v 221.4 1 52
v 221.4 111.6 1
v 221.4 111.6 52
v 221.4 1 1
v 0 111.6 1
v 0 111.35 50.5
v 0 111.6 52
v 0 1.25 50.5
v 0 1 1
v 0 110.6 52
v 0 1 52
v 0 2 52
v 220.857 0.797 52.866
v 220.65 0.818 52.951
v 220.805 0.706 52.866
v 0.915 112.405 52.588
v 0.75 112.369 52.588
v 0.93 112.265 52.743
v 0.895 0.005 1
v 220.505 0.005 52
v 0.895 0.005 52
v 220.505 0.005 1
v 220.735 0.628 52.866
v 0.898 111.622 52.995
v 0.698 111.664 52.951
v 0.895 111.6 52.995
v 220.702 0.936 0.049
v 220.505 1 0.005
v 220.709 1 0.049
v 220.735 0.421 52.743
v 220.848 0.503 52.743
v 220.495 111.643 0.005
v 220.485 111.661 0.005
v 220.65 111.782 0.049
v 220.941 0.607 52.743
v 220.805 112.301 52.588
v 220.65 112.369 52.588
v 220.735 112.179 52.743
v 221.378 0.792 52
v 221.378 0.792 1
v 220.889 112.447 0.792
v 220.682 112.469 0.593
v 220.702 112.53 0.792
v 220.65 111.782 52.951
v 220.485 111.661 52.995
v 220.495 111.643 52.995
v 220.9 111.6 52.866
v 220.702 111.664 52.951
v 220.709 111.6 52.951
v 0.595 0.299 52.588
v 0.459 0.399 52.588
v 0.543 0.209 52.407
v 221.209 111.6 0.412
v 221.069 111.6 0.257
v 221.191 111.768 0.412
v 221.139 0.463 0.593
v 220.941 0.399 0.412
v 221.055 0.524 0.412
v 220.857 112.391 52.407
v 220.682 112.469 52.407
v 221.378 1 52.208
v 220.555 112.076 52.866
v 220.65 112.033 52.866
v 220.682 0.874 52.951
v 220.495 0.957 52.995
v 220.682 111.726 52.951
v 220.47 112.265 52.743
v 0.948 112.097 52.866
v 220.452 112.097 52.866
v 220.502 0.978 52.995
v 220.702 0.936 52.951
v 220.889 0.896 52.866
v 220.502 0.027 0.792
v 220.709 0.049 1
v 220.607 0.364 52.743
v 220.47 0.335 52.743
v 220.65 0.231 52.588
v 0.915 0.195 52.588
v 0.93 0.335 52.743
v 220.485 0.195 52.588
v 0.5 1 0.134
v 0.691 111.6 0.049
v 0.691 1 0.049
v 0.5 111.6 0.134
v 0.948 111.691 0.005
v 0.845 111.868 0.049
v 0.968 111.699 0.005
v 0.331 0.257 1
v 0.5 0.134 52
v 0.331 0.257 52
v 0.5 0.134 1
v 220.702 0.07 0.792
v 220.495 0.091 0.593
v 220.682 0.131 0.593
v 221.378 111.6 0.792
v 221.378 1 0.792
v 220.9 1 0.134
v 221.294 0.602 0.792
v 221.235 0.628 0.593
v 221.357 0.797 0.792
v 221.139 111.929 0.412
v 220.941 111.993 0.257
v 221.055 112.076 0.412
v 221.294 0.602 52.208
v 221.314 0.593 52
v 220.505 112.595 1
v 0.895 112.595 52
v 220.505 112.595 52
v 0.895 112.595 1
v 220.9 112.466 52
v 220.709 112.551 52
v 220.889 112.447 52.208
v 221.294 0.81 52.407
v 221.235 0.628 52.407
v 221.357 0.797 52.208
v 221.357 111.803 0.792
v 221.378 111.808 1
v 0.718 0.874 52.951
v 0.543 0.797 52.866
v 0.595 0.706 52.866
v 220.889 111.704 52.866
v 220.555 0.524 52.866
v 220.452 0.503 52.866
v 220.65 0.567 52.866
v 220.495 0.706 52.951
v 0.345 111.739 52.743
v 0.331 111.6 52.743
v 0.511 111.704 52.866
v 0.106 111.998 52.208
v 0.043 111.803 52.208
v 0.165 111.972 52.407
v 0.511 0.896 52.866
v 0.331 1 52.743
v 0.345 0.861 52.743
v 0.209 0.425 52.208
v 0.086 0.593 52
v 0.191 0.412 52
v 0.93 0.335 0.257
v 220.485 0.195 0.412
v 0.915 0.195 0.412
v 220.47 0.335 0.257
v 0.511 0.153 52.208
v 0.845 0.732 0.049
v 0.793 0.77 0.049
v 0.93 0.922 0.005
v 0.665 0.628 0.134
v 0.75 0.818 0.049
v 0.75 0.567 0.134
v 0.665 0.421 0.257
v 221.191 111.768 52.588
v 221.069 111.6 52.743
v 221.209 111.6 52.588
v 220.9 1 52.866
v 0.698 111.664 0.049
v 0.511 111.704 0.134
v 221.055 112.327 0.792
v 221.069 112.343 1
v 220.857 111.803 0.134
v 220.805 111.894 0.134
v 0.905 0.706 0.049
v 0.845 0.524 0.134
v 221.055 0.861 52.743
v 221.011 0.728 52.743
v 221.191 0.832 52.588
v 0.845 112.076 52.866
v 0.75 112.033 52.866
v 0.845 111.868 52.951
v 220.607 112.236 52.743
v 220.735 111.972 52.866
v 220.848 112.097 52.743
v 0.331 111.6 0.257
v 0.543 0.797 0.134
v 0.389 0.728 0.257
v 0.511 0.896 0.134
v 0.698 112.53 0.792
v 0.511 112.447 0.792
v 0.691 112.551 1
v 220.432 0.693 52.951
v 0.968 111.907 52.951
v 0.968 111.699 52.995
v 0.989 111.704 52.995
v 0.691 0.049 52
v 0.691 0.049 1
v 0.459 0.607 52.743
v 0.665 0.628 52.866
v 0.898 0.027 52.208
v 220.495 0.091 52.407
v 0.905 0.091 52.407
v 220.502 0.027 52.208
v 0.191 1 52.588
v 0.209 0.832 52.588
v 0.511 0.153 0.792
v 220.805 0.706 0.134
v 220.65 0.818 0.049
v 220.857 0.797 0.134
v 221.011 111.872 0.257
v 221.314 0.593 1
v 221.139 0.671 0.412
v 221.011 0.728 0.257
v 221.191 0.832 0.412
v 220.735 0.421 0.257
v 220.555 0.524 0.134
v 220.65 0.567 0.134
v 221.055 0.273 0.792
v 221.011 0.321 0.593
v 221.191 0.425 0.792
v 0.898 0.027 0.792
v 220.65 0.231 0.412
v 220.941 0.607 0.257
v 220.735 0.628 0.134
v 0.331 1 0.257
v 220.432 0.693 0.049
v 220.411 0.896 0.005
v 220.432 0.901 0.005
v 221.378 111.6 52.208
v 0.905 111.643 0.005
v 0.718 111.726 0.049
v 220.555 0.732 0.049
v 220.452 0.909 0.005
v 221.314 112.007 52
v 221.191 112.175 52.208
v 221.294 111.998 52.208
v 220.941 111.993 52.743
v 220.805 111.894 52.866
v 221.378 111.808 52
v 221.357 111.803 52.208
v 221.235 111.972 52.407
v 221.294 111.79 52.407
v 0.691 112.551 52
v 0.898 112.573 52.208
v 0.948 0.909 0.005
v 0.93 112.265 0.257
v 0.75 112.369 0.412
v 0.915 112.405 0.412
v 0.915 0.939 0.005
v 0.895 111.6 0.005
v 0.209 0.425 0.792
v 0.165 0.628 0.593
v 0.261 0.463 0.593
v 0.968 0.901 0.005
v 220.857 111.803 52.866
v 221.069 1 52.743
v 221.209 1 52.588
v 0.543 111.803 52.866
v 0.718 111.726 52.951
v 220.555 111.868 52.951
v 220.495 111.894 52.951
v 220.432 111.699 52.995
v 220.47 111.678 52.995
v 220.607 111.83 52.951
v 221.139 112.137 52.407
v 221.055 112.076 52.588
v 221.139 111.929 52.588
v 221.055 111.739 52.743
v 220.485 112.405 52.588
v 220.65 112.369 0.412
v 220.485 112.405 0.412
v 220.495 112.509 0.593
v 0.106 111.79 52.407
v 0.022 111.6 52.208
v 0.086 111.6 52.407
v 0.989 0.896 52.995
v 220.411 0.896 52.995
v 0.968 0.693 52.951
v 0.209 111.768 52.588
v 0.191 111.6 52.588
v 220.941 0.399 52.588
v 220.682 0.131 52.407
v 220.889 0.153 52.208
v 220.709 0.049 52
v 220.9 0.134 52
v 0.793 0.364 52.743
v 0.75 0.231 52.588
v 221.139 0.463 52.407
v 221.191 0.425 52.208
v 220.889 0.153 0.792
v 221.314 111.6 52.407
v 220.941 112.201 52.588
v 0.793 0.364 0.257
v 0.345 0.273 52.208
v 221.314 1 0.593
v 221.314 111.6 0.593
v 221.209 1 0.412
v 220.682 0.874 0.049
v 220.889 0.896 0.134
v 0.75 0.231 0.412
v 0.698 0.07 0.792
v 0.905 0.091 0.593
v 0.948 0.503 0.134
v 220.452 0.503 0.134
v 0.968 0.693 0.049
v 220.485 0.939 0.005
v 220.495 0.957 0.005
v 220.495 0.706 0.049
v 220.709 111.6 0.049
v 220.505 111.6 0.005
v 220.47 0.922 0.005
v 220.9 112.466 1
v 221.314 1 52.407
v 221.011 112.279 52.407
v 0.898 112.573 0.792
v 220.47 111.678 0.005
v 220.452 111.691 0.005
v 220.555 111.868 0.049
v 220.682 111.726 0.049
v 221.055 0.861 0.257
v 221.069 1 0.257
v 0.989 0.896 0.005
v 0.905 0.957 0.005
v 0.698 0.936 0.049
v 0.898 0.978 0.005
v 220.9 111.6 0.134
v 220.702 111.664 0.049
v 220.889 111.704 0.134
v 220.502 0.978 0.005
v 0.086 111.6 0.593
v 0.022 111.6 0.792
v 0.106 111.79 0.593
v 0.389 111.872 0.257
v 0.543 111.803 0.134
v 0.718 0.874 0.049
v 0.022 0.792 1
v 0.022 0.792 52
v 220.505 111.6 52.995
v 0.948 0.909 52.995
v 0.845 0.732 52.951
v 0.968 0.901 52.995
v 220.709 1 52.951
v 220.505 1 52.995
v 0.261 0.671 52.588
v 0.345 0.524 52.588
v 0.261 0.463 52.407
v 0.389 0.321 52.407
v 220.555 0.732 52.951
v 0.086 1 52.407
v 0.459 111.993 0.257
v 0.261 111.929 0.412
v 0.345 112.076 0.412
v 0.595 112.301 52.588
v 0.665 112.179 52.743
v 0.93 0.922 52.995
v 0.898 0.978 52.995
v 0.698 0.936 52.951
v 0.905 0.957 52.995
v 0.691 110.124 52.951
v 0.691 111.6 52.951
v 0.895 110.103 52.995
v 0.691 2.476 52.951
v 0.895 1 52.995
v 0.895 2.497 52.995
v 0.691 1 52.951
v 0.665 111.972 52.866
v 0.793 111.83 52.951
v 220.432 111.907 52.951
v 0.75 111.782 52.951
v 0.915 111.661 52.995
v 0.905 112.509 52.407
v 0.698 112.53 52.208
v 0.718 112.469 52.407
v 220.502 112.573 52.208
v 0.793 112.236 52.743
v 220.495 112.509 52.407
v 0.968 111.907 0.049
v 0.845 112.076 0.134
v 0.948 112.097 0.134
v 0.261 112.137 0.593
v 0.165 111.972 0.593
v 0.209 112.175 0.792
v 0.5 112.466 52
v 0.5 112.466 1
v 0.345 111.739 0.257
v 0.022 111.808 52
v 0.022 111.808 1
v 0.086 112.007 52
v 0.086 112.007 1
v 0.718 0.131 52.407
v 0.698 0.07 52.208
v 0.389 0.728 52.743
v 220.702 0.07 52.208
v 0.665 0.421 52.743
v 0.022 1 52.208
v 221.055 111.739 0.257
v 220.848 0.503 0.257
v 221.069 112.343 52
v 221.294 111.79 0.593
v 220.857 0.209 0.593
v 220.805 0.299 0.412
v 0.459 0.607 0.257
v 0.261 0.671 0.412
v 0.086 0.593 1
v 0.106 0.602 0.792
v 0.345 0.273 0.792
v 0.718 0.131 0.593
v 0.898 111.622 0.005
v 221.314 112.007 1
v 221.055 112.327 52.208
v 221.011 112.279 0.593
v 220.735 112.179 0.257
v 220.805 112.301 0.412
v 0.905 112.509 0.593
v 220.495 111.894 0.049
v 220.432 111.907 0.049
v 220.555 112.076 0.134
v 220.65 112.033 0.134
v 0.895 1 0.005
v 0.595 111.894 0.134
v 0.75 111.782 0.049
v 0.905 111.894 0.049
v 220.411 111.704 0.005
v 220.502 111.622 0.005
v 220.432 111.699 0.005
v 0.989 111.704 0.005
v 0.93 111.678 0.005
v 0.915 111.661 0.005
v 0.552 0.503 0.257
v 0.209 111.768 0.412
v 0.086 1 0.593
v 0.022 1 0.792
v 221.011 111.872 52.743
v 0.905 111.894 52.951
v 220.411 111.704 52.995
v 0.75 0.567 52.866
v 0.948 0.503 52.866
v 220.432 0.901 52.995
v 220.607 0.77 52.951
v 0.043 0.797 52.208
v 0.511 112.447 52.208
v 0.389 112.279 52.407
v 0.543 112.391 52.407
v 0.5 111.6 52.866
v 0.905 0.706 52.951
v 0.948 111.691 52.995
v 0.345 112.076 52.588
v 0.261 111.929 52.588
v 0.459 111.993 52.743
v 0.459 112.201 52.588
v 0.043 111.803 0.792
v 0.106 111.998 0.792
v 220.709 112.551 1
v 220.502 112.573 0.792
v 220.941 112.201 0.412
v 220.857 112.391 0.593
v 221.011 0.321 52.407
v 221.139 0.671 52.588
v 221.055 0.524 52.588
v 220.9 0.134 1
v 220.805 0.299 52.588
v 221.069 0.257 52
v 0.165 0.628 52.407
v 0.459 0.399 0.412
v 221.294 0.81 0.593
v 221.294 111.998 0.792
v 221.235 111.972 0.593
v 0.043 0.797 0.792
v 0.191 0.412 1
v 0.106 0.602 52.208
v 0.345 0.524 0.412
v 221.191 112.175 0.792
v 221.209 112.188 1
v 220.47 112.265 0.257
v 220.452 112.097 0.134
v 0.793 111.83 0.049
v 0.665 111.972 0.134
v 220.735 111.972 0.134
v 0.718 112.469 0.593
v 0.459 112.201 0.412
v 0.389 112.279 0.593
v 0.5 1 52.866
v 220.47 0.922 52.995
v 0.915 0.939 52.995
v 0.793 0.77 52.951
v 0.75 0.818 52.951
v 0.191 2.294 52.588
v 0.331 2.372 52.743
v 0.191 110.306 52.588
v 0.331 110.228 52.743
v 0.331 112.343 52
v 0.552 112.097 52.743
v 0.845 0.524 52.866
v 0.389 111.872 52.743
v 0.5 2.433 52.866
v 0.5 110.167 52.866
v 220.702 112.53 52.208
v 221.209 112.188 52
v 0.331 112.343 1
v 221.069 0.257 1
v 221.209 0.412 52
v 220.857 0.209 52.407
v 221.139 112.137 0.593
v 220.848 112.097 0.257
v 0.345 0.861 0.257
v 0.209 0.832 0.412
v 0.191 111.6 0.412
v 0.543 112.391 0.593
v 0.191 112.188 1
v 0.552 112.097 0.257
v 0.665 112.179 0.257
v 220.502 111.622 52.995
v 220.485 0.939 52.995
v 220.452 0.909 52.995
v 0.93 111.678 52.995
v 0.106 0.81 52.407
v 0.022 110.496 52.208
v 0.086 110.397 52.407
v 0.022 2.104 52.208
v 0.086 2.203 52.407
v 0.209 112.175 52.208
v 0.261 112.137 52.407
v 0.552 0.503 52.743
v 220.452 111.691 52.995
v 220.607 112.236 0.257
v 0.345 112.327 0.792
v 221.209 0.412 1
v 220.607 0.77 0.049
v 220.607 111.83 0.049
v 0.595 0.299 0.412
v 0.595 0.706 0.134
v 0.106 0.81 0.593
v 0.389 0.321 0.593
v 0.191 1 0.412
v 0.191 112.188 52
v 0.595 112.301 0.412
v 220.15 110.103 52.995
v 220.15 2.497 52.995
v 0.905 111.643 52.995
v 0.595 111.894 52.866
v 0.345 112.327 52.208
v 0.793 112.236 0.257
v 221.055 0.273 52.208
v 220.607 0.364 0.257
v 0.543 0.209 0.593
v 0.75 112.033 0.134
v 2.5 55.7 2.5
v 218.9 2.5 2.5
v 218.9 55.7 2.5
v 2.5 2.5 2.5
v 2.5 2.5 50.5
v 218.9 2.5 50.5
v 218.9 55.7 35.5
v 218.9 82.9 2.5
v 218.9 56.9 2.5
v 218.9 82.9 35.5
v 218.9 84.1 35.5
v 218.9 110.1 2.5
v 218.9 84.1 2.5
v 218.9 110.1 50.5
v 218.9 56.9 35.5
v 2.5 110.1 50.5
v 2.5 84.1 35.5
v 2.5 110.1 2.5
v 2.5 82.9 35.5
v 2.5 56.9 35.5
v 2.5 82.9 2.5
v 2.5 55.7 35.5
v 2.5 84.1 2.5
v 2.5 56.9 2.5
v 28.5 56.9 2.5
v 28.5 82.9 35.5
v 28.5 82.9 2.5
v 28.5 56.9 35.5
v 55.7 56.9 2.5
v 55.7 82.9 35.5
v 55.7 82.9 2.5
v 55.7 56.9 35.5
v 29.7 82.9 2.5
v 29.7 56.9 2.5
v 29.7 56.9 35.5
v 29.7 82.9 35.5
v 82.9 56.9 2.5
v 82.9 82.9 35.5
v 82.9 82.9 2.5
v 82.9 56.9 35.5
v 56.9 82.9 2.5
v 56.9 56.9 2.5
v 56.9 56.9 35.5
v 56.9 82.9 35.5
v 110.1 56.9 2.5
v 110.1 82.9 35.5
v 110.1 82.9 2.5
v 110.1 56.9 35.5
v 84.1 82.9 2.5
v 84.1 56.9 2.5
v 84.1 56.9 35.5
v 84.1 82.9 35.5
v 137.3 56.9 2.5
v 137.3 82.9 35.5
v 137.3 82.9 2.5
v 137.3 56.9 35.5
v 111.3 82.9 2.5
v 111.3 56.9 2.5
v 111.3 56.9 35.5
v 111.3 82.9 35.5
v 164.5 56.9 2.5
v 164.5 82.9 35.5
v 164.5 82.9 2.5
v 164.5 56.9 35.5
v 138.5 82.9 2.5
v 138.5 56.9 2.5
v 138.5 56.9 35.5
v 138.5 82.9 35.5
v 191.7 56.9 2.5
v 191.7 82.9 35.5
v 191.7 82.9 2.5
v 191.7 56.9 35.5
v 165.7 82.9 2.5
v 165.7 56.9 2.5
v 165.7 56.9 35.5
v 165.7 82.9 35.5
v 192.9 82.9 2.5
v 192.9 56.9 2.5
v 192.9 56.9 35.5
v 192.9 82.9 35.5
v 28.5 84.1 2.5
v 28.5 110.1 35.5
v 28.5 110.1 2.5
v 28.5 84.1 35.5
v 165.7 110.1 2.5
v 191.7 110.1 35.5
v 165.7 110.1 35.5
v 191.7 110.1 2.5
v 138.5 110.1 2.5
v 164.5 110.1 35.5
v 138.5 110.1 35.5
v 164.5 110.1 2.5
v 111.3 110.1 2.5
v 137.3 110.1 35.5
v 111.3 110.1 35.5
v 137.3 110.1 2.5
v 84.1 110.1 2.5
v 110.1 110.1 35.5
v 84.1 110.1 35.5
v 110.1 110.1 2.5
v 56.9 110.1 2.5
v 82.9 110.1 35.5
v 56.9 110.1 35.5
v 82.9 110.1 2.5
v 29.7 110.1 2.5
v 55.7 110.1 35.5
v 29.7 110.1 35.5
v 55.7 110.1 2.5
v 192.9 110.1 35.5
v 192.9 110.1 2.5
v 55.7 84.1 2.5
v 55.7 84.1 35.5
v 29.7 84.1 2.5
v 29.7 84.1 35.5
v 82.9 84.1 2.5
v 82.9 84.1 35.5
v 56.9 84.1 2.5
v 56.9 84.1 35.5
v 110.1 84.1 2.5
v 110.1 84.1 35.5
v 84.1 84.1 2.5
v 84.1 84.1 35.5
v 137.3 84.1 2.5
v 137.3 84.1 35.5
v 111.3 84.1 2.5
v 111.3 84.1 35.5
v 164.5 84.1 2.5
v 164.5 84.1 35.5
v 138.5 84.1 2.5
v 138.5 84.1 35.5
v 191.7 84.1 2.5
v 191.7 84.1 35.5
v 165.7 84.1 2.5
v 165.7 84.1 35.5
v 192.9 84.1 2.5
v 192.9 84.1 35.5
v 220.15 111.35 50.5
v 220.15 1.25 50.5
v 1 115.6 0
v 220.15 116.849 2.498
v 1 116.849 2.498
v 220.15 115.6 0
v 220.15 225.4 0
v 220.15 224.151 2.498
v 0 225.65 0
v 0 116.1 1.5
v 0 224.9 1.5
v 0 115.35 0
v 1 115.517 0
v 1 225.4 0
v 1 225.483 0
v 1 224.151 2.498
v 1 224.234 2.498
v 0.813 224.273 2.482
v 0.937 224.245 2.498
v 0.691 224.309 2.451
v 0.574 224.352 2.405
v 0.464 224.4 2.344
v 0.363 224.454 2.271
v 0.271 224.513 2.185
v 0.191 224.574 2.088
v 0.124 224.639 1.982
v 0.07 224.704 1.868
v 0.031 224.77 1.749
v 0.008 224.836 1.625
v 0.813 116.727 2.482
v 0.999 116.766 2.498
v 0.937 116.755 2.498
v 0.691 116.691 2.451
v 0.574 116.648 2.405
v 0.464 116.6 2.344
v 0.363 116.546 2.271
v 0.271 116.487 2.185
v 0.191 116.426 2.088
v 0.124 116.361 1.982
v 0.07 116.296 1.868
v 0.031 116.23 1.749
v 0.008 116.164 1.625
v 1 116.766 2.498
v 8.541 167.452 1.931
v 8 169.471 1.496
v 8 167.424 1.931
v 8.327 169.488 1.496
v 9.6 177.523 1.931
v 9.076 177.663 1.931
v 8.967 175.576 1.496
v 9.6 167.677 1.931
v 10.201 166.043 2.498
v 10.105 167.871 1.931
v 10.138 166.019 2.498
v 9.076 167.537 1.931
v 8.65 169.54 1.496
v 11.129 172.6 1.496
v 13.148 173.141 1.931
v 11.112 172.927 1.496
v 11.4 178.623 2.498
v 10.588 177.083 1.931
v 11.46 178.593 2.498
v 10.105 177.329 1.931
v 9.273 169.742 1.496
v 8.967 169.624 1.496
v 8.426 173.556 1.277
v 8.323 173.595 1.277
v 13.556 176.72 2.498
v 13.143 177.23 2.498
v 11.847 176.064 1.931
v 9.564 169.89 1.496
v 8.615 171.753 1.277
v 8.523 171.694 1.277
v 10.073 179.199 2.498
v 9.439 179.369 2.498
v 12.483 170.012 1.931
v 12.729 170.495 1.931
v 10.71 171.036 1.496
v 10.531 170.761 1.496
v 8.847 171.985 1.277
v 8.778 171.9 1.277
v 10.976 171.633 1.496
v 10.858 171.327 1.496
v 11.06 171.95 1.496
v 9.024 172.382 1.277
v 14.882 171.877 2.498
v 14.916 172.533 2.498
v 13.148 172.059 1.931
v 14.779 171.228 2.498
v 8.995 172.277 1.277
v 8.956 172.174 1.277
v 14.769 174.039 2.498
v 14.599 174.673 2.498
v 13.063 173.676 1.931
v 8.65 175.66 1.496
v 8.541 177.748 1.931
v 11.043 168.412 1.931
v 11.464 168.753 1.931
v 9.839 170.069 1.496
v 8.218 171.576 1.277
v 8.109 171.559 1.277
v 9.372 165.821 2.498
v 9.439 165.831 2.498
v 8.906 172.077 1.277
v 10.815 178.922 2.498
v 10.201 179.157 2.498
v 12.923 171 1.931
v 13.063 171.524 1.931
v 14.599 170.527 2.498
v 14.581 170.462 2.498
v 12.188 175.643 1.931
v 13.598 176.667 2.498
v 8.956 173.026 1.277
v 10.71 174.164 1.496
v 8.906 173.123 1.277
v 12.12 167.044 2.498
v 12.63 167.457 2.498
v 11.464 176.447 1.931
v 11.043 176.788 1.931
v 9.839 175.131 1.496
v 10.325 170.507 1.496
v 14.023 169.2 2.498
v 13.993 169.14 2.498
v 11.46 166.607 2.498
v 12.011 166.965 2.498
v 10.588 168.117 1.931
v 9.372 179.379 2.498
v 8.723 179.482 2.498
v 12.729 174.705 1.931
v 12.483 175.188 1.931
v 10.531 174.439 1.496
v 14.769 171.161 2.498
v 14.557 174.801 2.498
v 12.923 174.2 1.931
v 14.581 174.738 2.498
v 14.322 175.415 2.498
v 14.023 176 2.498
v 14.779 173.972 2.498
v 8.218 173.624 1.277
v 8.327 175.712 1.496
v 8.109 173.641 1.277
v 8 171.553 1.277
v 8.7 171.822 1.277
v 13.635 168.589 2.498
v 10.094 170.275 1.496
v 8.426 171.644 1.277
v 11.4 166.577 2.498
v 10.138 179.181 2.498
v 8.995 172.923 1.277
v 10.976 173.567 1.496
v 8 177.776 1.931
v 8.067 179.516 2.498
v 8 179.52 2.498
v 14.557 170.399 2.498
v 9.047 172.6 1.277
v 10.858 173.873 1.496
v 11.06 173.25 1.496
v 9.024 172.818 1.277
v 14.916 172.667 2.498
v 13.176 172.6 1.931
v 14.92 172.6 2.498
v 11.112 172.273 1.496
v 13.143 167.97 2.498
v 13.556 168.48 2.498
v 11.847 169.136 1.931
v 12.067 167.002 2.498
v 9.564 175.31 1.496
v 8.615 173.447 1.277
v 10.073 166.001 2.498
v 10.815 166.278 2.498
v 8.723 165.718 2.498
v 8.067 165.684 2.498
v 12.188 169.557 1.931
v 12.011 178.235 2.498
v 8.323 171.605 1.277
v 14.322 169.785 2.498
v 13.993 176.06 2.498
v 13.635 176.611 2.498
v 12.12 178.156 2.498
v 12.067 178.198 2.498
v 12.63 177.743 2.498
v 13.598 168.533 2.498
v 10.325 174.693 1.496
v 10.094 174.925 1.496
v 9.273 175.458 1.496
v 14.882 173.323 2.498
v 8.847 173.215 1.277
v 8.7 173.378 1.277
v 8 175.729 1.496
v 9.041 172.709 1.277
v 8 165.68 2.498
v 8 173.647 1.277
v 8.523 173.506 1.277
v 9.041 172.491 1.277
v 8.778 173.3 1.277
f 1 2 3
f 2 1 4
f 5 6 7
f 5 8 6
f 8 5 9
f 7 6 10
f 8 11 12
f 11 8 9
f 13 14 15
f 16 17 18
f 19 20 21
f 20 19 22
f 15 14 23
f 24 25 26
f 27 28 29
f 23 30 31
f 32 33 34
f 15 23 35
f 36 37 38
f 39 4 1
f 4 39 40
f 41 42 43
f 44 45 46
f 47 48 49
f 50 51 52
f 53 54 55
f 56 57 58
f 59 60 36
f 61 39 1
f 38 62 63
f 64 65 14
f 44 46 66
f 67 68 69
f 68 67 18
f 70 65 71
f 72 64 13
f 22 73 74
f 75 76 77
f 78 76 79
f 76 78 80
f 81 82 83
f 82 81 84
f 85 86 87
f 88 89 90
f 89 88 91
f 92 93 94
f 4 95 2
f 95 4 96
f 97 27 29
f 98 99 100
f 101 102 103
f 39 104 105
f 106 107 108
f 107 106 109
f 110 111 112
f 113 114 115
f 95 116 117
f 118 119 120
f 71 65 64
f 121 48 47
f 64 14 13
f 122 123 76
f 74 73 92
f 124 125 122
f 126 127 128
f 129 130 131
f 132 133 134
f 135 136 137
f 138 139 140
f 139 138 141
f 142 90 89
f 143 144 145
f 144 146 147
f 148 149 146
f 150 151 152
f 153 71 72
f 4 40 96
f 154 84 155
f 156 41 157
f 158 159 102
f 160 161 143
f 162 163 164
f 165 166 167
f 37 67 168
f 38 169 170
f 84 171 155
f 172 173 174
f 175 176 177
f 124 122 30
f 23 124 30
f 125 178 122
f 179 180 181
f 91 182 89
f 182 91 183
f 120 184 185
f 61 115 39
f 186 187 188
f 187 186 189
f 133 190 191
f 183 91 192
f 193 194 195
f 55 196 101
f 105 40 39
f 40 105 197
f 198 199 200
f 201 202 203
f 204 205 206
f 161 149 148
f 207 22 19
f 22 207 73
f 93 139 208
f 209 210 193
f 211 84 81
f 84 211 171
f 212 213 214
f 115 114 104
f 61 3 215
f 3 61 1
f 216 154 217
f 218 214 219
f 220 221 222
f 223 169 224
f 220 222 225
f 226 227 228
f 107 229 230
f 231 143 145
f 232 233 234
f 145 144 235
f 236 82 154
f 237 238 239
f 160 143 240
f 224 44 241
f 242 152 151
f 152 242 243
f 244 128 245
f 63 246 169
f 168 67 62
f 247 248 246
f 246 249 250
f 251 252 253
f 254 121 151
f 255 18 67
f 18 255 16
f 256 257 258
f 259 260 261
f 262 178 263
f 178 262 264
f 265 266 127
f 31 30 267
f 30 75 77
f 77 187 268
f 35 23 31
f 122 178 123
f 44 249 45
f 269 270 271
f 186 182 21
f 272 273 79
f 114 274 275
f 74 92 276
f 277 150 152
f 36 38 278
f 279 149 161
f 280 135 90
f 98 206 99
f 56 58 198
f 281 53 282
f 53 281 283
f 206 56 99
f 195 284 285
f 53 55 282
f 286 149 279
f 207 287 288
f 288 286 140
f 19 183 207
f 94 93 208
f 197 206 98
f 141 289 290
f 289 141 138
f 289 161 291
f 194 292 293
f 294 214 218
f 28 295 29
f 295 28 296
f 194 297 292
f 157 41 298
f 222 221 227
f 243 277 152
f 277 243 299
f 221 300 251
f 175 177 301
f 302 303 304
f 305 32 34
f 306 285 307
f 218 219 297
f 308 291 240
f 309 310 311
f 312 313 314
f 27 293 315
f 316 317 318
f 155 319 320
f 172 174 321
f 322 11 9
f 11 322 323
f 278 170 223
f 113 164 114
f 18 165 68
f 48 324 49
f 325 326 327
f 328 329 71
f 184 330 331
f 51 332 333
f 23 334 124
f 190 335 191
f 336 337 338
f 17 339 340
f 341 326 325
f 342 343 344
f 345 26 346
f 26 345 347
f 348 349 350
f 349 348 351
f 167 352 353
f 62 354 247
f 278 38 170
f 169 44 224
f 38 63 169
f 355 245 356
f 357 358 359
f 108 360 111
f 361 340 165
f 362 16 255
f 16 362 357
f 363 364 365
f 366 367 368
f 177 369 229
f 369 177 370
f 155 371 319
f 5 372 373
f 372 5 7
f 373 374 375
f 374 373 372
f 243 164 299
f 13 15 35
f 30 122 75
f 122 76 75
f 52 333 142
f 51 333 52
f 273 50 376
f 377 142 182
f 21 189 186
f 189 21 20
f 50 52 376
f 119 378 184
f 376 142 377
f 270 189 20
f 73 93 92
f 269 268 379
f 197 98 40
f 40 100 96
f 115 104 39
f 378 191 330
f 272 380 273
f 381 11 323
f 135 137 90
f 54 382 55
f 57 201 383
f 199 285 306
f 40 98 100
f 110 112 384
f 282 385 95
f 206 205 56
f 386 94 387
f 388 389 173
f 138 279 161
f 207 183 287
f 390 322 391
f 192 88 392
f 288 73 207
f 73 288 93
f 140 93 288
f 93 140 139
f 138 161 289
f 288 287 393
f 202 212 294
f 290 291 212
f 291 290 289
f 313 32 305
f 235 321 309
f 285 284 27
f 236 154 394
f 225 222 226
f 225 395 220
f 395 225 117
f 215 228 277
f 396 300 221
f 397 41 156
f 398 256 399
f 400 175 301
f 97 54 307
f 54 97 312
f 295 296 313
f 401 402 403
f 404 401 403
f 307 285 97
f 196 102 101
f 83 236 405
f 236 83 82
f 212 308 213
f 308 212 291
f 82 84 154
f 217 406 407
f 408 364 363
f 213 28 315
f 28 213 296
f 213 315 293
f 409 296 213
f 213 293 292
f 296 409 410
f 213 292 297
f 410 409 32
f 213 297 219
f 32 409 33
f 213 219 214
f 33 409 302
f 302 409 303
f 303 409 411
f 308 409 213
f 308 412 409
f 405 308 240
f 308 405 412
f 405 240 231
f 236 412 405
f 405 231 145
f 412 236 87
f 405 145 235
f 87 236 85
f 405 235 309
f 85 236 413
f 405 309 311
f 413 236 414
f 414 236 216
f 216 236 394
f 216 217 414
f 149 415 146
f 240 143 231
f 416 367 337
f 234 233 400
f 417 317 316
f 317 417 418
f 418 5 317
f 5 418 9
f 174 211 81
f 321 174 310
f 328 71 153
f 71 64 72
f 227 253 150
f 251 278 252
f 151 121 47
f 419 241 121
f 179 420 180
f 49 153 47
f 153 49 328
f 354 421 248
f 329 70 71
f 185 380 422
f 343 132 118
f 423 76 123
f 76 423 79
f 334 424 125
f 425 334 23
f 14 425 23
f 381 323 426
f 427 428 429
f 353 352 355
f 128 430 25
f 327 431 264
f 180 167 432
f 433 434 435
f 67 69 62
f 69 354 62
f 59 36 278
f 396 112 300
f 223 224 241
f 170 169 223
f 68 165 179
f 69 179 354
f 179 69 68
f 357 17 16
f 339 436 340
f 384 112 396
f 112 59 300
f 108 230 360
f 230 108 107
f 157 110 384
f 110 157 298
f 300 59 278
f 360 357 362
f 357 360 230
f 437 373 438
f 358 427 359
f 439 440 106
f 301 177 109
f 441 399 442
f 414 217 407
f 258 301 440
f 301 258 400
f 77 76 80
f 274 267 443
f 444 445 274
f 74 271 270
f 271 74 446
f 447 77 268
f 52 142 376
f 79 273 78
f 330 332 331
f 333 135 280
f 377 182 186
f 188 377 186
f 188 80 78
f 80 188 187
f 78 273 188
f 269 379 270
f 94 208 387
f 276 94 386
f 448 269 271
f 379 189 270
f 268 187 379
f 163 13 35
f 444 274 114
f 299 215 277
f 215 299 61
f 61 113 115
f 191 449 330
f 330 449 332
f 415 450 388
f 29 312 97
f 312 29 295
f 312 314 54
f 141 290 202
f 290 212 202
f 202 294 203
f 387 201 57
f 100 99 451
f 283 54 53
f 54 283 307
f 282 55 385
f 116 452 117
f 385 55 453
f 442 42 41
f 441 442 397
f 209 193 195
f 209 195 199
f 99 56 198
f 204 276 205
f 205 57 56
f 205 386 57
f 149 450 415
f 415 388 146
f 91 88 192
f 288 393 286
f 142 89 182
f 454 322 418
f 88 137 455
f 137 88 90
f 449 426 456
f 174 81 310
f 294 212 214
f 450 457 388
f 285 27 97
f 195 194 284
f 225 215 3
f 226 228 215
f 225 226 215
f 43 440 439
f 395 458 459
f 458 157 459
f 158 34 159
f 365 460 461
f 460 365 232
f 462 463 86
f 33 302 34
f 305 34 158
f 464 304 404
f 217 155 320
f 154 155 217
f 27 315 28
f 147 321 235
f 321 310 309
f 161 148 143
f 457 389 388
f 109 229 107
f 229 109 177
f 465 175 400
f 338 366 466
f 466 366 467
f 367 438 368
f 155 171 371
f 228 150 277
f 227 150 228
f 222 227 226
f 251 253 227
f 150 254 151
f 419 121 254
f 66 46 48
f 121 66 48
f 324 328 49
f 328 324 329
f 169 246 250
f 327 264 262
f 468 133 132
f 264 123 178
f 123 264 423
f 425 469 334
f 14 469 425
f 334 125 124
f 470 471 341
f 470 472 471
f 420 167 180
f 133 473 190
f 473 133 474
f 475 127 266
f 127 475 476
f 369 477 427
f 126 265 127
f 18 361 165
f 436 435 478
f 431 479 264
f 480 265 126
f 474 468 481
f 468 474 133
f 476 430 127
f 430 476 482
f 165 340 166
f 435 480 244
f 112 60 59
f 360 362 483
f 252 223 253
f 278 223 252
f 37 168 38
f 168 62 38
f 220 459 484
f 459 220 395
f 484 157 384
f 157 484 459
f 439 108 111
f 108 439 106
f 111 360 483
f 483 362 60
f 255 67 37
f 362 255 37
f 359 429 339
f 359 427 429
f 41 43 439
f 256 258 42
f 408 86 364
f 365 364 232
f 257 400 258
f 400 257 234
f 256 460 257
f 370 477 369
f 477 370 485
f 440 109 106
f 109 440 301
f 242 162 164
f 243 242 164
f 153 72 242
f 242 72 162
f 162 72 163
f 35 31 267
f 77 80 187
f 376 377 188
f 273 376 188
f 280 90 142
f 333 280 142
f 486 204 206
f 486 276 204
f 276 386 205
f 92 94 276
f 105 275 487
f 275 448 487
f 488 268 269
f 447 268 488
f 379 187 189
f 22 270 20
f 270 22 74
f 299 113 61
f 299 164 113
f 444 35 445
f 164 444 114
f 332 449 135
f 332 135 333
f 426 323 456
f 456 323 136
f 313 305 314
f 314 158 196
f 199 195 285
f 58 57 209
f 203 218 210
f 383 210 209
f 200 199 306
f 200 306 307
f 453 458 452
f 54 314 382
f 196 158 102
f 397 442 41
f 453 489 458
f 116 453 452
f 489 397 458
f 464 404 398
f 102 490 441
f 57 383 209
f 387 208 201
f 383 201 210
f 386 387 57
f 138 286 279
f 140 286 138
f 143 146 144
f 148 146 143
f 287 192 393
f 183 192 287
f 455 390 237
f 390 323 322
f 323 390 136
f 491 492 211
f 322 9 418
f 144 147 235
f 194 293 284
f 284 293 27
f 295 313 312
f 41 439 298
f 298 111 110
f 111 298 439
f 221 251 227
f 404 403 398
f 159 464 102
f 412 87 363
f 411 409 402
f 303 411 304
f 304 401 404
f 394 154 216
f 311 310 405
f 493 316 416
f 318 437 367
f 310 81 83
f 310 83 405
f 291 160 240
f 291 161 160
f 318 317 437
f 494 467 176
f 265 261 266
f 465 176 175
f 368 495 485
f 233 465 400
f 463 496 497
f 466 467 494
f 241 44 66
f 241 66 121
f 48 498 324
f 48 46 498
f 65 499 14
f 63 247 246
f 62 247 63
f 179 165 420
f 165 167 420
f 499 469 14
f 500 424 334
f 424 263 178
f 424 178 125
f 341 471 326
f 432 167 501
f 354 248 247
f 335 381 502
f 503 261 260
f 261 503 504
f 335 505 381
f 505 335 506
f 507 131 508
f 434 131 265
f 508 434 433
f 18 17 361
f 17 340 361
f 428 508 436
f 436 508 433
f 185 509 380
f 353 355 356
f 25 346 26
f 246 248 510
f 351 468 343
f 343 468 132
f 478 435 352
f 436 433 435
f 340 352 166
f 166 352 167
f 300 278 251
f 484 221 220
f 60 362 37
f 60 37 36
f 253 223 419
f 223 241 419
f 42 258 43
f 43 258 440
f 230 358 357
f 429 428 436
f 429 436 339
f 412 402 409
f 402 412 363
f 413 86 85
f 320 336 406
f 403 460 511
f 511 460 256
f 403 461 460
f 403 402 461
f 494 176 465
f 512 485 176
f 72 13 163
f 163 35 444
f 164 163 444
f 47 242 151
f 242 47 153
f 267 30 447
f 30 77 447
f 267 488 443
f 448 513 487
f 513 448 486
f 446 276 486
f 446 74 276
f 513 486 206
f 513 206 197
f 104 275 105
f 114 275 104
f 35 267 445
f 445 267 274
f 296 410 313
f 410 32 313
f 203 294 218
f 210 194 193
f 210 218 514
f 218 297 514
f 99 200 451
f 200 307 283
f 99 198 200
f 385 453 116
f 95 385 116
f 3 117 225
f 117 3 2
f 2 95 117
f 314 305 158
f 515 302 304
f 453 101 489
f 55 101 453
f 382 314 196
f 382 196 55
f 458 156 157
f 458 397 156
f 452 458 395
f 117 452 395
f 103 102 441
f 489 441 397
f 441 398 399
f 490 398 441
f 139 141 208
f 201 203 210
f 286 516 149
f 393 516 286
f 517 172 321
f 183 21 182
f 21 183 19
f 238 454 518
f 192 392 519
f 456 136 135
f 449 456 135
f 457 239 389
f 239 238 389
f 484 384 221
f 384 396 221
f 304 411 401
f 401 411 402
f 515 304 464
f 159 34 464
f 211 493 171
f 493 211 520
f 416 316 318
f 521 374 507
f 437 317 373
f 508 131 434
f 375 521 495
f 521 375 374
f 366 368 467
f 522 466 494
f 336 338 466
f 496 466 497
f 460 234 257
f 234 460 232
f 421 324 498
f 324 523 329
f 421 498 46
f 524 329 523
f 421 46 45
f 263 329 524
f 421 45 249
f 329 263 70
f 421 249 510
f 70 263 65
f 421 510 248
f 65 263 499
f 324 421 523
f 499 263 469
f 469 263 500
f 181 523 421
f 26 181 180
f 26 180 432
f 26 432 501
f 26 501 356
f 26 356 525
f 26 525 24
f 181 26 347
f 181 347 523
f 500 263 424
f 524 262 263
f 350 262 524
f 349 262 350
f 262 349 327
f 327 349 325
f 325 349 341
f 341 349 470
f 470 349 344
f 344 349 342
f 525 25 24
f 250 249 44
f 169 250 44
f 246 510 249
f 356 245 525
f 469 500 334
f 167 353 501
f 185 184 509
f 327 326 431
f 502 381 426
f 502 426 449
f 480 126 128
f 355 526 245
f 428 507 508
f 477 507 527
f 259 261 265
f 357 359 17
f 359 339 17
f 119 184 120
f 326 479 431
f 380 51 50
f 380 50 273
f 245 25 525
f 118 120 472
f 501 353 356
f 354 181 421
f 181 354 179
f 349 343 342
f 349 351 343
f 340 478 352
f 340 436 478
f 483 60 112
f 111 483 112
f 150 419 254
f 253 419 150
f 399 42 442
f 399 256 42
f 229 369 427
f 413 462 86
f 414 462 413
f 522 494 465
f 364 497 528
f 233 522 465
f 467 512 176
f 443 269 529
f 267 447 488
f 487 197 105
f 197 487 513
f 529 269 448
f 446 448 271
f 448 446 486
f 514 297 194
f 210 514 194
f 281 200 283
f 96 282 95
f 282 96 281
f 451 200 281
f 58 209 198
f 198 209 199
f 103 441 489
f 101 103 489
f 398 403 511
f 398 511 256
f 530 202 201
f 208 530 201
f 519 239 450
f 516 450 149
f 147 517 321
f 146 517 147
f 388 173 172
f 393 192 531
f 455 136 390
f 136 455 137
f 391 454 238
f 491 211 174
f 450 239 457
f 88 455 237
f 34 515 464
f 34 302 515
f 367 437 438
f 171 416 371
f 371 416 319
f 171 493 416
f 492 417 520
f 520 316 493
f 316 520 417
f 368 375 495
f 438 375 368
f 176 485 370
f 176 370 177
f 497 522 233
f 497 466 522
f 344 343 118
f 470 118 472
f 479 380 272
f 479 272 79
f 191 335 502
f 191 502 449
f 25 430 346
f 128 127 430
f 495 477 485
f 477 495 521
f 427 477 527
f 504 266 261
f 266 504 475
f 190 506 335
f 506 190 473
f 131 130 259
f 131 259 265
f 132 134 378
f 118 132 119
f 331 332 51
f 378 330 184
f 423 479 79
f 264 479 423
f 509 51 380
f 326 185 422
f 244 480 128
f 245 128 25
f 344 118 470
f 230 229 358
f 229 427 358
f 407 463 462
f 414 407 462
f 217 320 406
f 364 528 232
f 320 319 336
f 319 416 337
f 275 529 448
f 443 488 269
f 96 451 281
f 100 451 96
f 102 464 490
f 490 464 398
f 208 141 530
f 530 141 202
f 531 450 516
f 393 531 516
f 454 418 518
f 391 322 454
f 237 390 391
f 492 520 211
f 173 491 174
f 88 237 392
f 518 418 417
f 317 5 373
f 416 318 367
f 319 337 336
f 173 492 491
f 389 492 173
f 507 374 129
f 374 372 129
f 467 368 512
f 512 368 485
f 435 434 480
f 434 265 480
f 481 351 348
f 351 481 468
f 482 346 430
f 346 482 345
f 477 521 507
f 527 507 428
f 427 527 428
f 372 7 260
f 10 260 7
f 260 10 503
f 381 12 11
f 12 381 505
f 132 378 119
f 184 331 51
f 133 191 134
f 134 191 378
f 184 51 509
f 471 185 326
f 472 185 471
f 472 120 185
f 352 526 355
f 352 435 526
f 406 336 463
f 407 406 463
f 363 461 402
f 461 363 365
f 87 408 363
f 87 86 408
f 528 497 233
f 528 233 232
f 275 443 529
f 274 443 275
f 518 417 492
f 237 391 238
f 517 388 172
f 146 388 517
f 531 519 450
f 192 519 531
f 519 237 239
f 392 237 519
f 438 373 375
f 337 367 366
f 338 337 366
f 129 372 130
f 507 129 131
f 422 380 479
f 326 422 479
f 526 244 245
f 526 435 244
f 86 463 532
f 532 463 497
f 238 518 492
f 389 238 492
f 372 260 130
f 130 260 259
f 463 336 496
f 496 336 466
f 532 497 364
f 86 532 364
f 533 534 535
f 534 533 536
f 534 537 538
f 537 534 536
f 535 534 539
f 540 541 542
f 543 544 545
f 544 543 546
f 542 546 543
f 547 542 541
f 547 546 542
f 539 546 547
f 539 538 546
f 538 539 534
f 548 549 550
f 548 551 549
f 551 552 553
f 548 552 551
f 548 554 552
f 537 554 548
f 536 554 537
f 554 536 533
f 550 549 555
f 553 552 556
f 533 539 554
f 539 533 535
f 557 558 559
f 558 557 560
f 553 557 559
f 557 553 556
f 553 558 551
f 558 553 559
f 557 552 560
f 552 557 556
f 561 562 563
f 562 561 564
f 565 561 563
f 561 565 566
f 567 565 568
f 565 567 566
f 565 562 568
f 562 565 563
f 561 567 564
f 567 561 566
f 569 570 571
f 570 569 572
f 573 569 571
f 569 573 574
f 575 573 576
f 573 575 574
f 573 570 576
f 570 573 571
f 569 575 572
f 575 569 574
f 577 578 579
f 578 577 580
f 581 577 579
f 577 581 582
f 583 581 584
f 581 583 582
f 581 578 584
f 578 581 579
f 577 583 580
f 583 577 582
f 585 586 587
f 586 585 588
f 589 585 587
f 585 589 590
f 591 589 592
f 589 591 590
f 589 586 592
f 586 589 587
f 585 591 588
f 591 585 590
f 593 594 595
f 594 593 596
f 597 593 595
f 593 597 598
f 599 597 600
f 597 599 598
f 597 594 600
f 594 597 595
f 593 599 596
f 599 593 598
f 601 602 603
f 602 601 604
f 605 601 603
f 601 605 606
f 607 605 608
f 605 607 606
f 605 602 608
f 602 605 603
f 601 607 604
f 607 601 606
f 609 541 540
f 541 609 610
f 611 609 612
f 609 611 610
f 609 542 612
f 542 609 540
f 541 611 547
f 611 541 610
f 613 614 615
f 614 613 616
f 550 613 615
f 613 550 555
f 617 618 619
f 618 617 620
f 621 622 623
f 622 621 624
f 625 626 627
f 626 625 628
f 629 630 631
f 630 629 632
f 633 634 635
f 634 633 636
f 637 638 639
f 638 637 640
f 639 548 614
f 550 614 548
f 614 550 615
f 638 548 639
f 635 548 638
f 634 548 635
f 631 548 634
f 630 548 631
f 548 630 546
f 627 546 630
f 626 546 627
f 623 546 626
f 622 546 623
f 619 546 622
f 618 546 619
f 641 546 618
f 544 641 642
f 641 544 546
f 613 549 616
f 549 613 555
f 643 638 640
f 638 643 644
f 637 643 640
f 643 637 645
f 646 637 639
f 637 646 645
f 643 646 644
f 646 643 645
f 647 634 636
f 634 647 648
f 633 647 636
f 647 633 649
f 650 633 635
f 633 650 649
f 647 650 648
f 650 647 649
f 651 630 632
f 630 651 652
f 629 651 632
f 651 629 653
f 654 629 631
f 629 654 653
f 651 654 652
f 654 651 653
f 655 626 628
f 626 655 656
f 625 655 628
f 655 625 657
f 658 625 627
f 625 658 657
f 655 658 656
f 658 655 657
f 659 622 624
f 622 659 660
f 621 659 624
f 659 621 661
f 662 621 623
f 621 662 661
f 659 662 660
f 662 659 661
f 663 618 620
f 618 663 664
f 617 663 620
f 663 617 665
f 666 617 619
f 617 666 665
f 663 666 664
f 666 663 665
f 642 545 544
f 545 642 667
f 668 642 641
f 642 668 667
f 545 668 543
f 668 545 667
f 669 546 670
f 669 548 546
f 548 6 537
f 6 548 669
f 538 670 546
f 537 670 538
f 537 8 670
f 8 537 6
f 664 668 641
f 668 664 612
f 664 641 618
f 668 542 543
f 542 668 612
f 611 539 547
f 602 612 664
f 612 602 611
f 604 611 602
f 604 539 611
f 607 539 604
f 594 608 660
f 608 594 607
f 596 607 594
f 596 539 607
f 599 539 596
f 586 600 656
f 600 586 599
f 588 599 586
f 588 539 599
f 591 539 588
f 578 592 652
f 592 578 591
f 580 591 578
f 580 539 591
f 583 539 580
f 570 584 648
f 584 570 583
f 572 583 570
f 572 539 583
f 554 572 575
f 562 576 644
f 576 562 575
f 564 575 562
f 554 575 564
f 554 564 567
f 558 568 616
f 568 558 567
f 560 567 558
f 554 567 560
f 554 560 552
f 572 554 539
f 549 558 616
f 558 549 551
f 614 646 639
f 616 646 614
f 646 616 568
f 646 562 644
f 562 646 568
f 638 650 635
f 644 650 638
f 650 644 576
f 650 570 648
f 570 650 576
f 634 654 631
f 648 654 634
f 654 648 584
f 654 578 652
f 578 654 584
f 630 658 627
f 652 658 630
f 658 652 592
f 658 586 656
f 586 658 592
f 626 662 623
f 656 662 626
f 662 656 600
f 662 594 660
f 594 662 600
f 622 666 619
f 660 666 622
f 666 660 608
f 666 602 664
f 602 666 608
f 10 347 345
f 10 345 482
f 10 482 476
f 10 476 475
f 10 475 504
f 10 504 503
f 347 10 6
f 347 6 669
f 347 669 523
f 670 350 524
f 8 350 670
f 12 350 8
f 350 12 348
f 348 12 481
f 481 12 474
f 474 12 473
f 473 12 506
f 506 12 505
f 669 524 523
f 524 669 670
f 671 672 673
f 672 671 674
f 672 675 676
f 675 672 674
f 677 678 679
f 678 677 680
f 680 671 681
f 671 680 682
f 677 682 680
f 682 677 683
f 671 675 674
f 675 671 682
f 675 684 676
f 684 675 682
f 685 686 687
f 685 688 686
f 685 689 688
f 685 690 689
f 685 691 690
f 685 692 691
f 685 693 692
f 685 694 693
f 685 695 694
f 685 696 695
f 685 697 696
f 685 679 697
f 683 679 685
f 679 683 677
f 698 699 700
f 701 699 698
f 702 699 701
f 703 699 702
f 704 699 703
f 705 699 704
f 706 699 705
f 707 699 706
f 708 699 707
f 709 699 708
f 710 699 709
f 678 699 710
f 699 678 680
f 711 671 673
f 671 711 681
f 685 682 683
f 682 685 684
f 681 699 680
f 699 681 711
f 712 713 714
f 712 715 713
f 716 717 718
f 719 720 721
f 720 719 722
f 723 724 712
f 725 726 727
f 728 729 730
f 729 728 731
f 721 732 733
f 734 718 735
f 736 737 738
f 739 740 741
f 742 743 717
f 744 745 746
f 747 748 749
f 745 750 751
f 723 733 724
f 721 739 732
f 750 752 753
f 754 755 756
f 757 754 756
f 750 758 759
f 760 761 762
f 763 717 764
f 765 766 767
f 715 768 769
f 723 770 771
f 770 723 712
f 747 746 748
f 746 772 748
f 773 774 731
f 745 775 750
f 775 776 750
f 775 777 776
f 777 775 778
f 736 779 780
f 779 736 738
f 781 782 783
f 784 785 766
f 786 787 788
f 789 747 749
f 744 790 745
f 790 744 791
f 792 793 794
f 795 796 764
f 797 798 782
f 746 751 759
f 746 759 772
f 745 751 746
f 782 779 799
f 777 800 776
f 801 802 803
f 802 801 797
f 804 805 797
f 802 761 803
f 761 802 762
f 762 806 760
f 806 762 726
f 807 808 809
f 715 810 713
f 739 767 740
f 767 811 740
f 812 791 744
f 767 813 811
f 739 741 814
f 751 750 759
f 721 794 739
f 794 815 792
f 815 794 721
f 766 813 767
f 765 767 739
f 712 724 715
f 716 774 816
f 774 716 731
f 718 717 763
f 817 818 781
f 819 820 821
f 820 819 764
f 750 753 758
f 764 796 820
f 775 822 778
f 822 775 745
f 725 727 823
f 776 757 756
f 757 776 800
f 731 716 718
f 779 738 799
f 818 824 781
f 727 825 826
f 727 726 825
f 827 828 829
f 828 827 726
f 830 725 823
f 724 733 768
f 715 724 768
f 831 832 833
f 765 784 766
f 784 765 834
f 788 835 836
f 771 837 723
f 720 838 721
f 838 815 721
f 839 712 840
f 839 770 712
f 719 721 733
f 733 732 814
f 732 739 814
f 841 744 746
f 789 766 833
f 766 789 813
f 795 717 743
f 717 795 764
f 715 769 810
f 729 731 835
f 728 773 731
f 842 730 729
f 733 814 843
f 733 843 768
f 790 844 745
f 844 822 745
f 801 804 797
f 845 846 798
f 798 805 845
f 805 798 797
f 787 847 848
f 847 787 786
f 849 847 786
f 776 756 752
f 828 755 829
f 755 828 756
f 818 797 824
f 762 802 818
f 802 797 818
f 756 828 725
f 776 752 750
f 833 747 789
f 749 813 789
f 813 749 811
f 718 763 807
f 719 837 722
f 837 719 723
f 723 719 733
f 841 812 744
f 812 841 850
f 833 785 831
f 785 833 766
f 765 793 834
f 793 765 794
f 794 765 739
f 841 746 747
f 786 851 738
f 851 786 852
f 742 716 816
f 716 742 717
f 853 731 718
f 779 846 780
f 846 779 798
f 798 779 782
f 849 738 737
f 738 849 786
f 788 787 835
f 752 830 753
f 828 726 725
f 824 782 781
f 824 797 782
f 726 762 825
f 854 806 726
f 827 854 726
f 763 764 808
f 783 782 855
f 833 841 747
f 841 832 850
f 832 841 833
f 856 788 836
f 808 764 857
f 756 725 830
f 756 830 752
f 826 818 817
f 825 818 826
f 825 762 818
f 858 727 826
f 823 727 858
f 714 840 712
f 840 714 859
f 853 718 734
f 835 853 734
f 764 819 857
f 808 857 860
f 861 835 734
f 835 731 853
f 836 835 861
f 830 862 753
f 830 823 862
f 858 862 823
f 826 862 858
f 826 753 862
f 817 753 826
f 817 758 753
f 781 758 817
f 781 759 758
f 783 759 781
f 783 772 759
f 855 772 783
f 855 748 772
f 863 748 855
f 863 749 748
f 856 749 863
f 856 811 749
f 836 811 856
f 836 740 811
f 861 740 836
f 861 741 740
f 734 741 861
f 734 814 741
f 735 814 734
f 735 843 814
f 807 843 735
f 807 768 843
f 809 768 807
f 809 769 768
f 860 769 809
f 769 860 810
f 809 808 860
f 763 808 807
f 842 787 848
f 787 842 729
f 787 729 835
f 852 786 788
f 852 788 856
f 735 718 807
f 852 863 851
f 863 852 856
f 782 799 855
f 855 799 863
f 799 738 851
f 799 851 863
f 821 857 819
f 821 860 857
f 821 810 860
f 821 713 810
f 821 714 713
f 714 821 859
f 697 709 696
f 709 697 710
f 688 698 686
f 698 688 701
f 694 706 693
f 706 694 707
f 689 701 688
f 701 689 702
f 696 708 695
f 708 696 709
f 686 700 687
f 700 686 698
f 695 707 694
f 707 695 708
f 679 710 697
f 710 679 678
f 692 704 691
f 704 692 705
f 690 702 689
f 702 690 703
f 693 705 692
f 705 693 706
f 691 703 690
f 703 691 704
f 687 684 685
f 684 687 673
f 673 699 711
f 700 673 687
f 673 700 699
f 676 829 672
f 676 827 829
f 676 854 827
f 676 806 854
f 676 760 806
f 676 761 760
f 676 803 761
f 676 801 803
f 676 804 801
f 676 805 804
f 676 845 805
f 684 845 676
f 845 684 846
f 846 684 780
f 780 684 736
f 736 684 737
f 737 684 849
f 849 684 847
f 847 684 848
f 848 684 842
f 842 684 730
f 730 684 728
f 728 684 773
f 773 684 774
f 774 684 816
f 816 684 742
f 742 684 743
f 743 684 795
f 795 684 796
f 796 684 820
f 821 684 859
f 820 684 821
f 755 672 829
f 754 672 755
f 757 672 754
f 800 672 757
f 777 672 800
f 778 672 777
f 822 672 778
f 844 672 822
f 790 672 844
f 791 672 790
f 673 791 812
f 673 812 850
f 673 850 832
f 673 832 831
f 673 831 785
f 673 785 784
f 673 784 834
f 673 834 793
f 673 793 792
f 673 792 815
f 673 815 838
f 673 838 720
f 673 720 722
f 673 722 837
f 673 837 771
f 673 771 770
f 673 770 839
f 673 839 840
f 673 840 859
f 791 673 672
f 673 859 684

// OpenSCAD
// Download both files into the same directory and make a copy of this template for each project. Adjust the variables and values as needed to override the defaults in this file as needed. In this way you can replace the `Ultimate_Box_Generator.scad` file with a new version without having to track and restore your changes.

// If you want to use any framework variables in calulations you must import them here. If you want to also change the variable you must use a second line below to do that.
wall=wall;
internal_wall=internal_wall;

// Include the framework. You can change the prefix to load from a shared path.
include    <Ultimate_Box_Generator.scad>;

// At this point you can start to adjust builtin varaibles and create your own. There are also some examples of more complex boxes at the end of the file.


// Parts to render. To do more complex opperations disable these and manually call make_box() and make_lid() instead.
show_box=true;	// Whether or not to render the box
show_lid=true;	// Whether or not to render the lid. To make open boxes with no lid set `show_lid=false` and `lid_type=5`.

// General Settings
comp_size_deep = 48; // Depth of compartments
comp_size_x = 26;	 // Size of compartments, X
comp_size_y = 26;	 // Size of compartments, Y
wall = 2.5;		    // Width of wall, see `internal_wall` below for alternate inner wall size.
repeat_x = 8;		// Number of compartments, X
repeat_y = 4;		// Number of compartments, Y
tolerance=.15;      // Tolerance around lid.  If it's too tight, increase this. If it's too loose, decrease it.

// Box Rounding
box_corner_radius=1; // Add a rounding affect to the corners of the box. Anything over `wall` will cause structure and lid problems.
//internal_corner_radius=1; // Add a rounding affect to the inside.
//mesh_corner_radius=0; // Leave a radius around each corner of the mesh. May hep with bridges.
//corner_fn=30;

// Supress individual walls.
//supress_walls_x=[]; // These are the walls running along the X axis. It should be an array of size [repeat_y-1][repeat_x].
//supress_walls_y=[]; // These are the walls running along the Y axis. It should be an array of size [repeat_x-1][repeat_y].
// Example for repeat_x=4, repeat_y=3:
//supress_walls_x=[[1,0,1,1],[0,1,0,1]];
//supress_walls_y=[[1,0,1],[0,1,1],[1,1,1]];
//supress_walls_x=[[1,0],[0,1]];
supress_walls_x=[[1,1,1,1,1,1,1,1]];
supress_walls_y=[[1,1],[1,1],[1,1],[1,1],[1,1],[1,1],[1,1],];
//supress_sides=false; // [X, Y, X, Y] Cutout/supress some sides. this may behave baddly with compartments or mesh.
//supress_sides_radius=wall; // Add a rounding to the cutout.
//supress_sides_offset=0; // 0, wall, [X, Y, Z] adjsut the coutout in all directions. + to grow, - so shrink
//supress_sides_fn=30;

// Mesh Settings
// To make rounded corners and no mesh use any `mesh_type` > 0 and set `strut_gap` to a high value.
// 0: No mesh, solid wall.
// 1: Single direction mesh.
// 2: Two direction cross mesh and 90 degree angle to eachother.
// 3: Two direction mesh but mirrored around 90 axsis instead or rotated 90 degrees.
// 4: Calculate angle across the diagonal of each opening. You will also want to change `strut_gap` to a large number and set `strut_count_min=1`.
// 5: No mesh, empty wall.
// 6: Honycomb. Also set `strut_width=wall/4` and `strut_gap=wall*2`. To big of a `strut_gap` may fail to print. Other shapes can be generated with `mesh_fn` and reducing `mesh_inset_padding` may help.
//mesh_type=0; // Mesh type, see above.
//mesh_rotation=0; // 0-90 degrees.
//mesh_alt_rotation=mesh_rotation; // Alternate rotation for top and bottom faces.
//mesh_do_sides=true; //[true, true, true, false] Include mesh on each side along axis. [X, Y, X, Y]
//mesh_do_bottom=false; // Include mesh on bottom plate.
//mesh_do_top=true; // Include mesh on top piece.
//mesh_do_interior=false; // Include mesh on inner walls.
//mesh_inset_padding=wall; // Leave some solid material before building strut frame. Anything less then wall/2 will likely fall apart.
//mesh_fn=mesh_type == 6 ? 6 : 40; // Complexity of curves in mesh's, increese for smoother curves.
//strut_width=wall*2; // Width of each strut, 0=hollow.
//strut_gap=wall; // Width of the air gap between each strut. 0=fine air gaps.
//strut_count_min=0; // Optinal minimum number of struts regardless of size calulations.
//alt_strut_width=strut_width; // Width of struts going the other directions.
//alt_strut_gap=strut_gap; // Width of gap going the other direction.
//alt_strut_count_min=strut_count_min; // Optinal minimum number of struts regardless of size calulations.
//mesh_overflow=0; // Extra rows to add to the mesh. For example in the Honeycomb partial hexegons will be created along the edges.

// Lid Settings
// 0: No Lid. top may be rounded and can cause other rendering changes.
// 1: Lid that slides off in the x direction.
// 2: Lid with a snapped in hinge that rotates open
// 3: Lid that snaps down onto the box. Also need to change lid_height to around 1.5mm.
// 4: Stackable version of cover 1 there boxes slide into one another. You will need one cover for the last box. (Not tested)
// 5: Oversized lid sits on top and has sides that extend down. (Needs snapp support)
//lid_type=1; // Lid type, see above.
//has_thumbhole=true; // Add gripping locations for easy opening.
//has_coinslot=false; // Add slot in the top for dropping in components.
//has_snap=true; // Add small ridges or snaps to lids to help keep them closed.
//coinslot_x=20;	// Size in X direction
//coinslot_y=2.5;	// Size in Y direction
//coinslot_corner_radius=0; // rounded coinslot corners if >0; best if less than half the shorter coinslot dimension
//z_tolerance=0;   // Z tolerance can be tweaked separately, to make the top of the sliding lid be flush with the top of the box itself.
//extra_bottom=.15; // Extra bottm wall height to fit type 4 slider.
//hinge_inset=.75; // Size of the hinge connection.
//snap_inset=.25; // Amount of overhang for snaps to snap into place.
//snap_tolerance=tolerance; // You may need to add tolerance around lid and snaps to let them move freely.
//lid_offset=3;		// This is how far away from the box to print the lid
//lid_height=wall*2;  // Height of lid. Must be greater than wall width for a `lid_type=5` lid to work. On Lid 3 is the depth of the inset snap.
//lid_fn=40; // Increese if printing thicker walls.
//lid_alt_offset=false; // Move lid in X instead of Y for printing.

//Internal Structure (You may need to turn off `mesh_do_sides` or `mesh_do_bottom` for good results.)
// You can also use `make_wall()` to manually add your own walls.
// 1: Rounded bottom frame.
// 2: Hexegon bottom frame. (To make this shape perfect set `comp_size_deep` to the width between to edges of the tile and set `comp_size_x` or `comp_size_y` to this this: `comp_size_deep / sqrt(3)*2`.
// 3: Rough bottom for make bits sit unevenly. (Partial)
// 4: Verical rounding on cordner. Set `internal_size_deep` to `comp_size_deep` and `internal_size_circle` to the shortest `comp_size` for a circle.
// 5: Vertical hexegon. Retulst may varry.
//internal_type=0; // Internal structure, see above.
//internal_rotate=false; // On lid axis or rotate to opposite.
//internal_size_deep=50; // How far into the box to start the internal structure. Should be `comp_size_deep/2` for type 1-2, `wall` for 3, or comp_size_deep for type 4-5.
//internal_size_circle=internal_type==1 ? internal_size_deep : internal_size_deep * 2 / sqrt(3); // Use this calculation, or the shorter comp_size for type 4-5.
//internal_fn=internal_type==1 || internal_type==4 ? 60 : 6; // Complexity of internal curves, may need to increase for larger or smoother curves.
internal_wall=1.2; // Custom size for internal walls.
internal_wall_deep=comp_size_deep-15; // If set to lower then comp_size_deep then the internal walls will be this tall.

// Text Settings
// 0: None.
// 1: Cutout. Remove material formt he wall.
// 2: Raised. If a mesh is ued part of it is filled in to hold the text. Lids 0 and 3 are printed upside down by default. With this option used they will require supports regardless of the orrientation printed.
//text_type=0; // Text type, see above.
//text_depth=wall/6; // Distance to cutout text or raise it. User `wall` to cut through.
//text_size=5; // Font Size.
//text_font="Courier New:style=Bold"; // Use Hepl -> Font List to see options.
//text_message="Red Player"; // Message Text, or use `["Line 1", "Line 2"]` for multiline.
//text_message_compartments=false;//[["AA", "BB", "CC"], ["AB", "BC", "CD"]]; // Custom text for compartments in top or bottom. Also support multiline as `[[ ["A", "B"] ]]`.
//text_sides=true;//[true, true, true, false]; // Sides to put text on, [X, Y, X, Y]
//text_top=true; // Put Text on the top.
//text_bottom=false; // Put Text on the bottom.
//text_rotation=0; // Rotate the top and bottom text by X degrees. 90 will rotate from the X axis to the Y axis.
//text_offset=0; // Text is verticaly centered in the wall. This may look "off" due to casing or hanging tails. You can manually adjust the vertical alignment with this setting.
//text_fn=30; // Complexity of the letters, may need to increese with larger fonts.
//text_backdrop_scale=[.9, 1.5]; // Font size scaleing used on the backdrop when `text_type=2` is used on sides with a mesh.

// Complex Structure
//make_complex_box=false; // Use an array of objects from `complex_box` to create many smaller boxes within the larger box.
//internal_grow_down=true; // If set compartments will be extruded into the larger box from the top to make a flush surface. (May make a model that uses a lot of material.
//internal_empty_bottom=false; // If set the area blow each box will be empty. This will not be printable on a FDM printer unless supports are included internally but still may save material and print time.



// In addition you can set `show_box=false;` and then call `make_box()` manually to join and remove more structure to it like in this example.
/*show_box=false;
difference() {
    make_box();
    translate([0, comp_size_y/2 + wall, 0])
    rotate([0, 90, 0])
    cylinder(comp_size_x +wall*2, 10, 10);
}*/

// You can also use calls to `make_internal_box` to create more complex boxes within a larger box that share a single lid.
/*show_box=false;
make_box();
intersection() {     
    faction_x=10; faction_y=comp_size_y; faction_z=5; faction_repeat_x=3; faction_repeat_y=1;
    faction_size_x=calc_size(faction_repeat_x, faction_x, wall=internal_wall, internal_wall=internal_wall);
faction_size_y=calc_size(faction_repeat_y, faction_y, wall=internal_wall, internal_wall=internal_wall);
    
    translate([wall, wall, wall])
    cube([faction_size_x - wall, faction_size_y - wall*2, comp_size_deep]);
            
    translate([wall-internal_wall, wall-internal_wall, wall-internal_wall])
    union() {
        translate([0, 0, 0])
        make_internal_box(faction_x, faction_y, faction_z, wall=internal_wall, repeat_x=faction_repeat_x, repeat_y=faction_repeat_y);
    }
}*/

// This exmaple wil make a complex series of boxes in a larger container. The object's can be used to position other oebjects and create internal structure.
/*comp_size_x = 200;
comp_size_y = 200;
comp_size_deep = 200;

internal_wall=wall/2;

comp1=make_object(x=10, y=30, z=45, offset_x=0, offset_y=0, repeat_x=3, repeat_y=1, color="Red");
comp2=make_object(x=35, y=40, z=45, offset_x=comp1[4][0], offset_y=0, repeat_x=1, repeat_y=1, color="Pink");
comp3=make_object(x=35, y=30, z=45, offset_x=comp2[4][0], offset_y=0, repeat_x=1, repeat_y=1, color="Orange");
comp4=make_object(x=150, y=100, z=75, offset_x=0, offset_y=comp1[4][1], repeat_x=1, repeat_y=1, color="Blue");

complex_box=[
    comp1, comp2, comp3, comp4,
    
];
make_complex_box=true;*/

// Some notes on complex prints:
/* OpenSCAD expereicne is required to do pretty much any type of customization or complex opperations. This will essentaily jsut make the containers within one larger object with a single lid. Alternatly multiple boxes could be reated and then joined together with translations to make a larger object with multiple lids. 
   Due to how variables are passed in OpenSCAD it can be tricky to get the parameters set on the parent box and child boxes as you want. It is best to use global variable assignmets to set the child box parameters, then pass overrides to the `make_box()` call yourself. (You have to also set `show_box=false;` if you ddo this.)
  */
